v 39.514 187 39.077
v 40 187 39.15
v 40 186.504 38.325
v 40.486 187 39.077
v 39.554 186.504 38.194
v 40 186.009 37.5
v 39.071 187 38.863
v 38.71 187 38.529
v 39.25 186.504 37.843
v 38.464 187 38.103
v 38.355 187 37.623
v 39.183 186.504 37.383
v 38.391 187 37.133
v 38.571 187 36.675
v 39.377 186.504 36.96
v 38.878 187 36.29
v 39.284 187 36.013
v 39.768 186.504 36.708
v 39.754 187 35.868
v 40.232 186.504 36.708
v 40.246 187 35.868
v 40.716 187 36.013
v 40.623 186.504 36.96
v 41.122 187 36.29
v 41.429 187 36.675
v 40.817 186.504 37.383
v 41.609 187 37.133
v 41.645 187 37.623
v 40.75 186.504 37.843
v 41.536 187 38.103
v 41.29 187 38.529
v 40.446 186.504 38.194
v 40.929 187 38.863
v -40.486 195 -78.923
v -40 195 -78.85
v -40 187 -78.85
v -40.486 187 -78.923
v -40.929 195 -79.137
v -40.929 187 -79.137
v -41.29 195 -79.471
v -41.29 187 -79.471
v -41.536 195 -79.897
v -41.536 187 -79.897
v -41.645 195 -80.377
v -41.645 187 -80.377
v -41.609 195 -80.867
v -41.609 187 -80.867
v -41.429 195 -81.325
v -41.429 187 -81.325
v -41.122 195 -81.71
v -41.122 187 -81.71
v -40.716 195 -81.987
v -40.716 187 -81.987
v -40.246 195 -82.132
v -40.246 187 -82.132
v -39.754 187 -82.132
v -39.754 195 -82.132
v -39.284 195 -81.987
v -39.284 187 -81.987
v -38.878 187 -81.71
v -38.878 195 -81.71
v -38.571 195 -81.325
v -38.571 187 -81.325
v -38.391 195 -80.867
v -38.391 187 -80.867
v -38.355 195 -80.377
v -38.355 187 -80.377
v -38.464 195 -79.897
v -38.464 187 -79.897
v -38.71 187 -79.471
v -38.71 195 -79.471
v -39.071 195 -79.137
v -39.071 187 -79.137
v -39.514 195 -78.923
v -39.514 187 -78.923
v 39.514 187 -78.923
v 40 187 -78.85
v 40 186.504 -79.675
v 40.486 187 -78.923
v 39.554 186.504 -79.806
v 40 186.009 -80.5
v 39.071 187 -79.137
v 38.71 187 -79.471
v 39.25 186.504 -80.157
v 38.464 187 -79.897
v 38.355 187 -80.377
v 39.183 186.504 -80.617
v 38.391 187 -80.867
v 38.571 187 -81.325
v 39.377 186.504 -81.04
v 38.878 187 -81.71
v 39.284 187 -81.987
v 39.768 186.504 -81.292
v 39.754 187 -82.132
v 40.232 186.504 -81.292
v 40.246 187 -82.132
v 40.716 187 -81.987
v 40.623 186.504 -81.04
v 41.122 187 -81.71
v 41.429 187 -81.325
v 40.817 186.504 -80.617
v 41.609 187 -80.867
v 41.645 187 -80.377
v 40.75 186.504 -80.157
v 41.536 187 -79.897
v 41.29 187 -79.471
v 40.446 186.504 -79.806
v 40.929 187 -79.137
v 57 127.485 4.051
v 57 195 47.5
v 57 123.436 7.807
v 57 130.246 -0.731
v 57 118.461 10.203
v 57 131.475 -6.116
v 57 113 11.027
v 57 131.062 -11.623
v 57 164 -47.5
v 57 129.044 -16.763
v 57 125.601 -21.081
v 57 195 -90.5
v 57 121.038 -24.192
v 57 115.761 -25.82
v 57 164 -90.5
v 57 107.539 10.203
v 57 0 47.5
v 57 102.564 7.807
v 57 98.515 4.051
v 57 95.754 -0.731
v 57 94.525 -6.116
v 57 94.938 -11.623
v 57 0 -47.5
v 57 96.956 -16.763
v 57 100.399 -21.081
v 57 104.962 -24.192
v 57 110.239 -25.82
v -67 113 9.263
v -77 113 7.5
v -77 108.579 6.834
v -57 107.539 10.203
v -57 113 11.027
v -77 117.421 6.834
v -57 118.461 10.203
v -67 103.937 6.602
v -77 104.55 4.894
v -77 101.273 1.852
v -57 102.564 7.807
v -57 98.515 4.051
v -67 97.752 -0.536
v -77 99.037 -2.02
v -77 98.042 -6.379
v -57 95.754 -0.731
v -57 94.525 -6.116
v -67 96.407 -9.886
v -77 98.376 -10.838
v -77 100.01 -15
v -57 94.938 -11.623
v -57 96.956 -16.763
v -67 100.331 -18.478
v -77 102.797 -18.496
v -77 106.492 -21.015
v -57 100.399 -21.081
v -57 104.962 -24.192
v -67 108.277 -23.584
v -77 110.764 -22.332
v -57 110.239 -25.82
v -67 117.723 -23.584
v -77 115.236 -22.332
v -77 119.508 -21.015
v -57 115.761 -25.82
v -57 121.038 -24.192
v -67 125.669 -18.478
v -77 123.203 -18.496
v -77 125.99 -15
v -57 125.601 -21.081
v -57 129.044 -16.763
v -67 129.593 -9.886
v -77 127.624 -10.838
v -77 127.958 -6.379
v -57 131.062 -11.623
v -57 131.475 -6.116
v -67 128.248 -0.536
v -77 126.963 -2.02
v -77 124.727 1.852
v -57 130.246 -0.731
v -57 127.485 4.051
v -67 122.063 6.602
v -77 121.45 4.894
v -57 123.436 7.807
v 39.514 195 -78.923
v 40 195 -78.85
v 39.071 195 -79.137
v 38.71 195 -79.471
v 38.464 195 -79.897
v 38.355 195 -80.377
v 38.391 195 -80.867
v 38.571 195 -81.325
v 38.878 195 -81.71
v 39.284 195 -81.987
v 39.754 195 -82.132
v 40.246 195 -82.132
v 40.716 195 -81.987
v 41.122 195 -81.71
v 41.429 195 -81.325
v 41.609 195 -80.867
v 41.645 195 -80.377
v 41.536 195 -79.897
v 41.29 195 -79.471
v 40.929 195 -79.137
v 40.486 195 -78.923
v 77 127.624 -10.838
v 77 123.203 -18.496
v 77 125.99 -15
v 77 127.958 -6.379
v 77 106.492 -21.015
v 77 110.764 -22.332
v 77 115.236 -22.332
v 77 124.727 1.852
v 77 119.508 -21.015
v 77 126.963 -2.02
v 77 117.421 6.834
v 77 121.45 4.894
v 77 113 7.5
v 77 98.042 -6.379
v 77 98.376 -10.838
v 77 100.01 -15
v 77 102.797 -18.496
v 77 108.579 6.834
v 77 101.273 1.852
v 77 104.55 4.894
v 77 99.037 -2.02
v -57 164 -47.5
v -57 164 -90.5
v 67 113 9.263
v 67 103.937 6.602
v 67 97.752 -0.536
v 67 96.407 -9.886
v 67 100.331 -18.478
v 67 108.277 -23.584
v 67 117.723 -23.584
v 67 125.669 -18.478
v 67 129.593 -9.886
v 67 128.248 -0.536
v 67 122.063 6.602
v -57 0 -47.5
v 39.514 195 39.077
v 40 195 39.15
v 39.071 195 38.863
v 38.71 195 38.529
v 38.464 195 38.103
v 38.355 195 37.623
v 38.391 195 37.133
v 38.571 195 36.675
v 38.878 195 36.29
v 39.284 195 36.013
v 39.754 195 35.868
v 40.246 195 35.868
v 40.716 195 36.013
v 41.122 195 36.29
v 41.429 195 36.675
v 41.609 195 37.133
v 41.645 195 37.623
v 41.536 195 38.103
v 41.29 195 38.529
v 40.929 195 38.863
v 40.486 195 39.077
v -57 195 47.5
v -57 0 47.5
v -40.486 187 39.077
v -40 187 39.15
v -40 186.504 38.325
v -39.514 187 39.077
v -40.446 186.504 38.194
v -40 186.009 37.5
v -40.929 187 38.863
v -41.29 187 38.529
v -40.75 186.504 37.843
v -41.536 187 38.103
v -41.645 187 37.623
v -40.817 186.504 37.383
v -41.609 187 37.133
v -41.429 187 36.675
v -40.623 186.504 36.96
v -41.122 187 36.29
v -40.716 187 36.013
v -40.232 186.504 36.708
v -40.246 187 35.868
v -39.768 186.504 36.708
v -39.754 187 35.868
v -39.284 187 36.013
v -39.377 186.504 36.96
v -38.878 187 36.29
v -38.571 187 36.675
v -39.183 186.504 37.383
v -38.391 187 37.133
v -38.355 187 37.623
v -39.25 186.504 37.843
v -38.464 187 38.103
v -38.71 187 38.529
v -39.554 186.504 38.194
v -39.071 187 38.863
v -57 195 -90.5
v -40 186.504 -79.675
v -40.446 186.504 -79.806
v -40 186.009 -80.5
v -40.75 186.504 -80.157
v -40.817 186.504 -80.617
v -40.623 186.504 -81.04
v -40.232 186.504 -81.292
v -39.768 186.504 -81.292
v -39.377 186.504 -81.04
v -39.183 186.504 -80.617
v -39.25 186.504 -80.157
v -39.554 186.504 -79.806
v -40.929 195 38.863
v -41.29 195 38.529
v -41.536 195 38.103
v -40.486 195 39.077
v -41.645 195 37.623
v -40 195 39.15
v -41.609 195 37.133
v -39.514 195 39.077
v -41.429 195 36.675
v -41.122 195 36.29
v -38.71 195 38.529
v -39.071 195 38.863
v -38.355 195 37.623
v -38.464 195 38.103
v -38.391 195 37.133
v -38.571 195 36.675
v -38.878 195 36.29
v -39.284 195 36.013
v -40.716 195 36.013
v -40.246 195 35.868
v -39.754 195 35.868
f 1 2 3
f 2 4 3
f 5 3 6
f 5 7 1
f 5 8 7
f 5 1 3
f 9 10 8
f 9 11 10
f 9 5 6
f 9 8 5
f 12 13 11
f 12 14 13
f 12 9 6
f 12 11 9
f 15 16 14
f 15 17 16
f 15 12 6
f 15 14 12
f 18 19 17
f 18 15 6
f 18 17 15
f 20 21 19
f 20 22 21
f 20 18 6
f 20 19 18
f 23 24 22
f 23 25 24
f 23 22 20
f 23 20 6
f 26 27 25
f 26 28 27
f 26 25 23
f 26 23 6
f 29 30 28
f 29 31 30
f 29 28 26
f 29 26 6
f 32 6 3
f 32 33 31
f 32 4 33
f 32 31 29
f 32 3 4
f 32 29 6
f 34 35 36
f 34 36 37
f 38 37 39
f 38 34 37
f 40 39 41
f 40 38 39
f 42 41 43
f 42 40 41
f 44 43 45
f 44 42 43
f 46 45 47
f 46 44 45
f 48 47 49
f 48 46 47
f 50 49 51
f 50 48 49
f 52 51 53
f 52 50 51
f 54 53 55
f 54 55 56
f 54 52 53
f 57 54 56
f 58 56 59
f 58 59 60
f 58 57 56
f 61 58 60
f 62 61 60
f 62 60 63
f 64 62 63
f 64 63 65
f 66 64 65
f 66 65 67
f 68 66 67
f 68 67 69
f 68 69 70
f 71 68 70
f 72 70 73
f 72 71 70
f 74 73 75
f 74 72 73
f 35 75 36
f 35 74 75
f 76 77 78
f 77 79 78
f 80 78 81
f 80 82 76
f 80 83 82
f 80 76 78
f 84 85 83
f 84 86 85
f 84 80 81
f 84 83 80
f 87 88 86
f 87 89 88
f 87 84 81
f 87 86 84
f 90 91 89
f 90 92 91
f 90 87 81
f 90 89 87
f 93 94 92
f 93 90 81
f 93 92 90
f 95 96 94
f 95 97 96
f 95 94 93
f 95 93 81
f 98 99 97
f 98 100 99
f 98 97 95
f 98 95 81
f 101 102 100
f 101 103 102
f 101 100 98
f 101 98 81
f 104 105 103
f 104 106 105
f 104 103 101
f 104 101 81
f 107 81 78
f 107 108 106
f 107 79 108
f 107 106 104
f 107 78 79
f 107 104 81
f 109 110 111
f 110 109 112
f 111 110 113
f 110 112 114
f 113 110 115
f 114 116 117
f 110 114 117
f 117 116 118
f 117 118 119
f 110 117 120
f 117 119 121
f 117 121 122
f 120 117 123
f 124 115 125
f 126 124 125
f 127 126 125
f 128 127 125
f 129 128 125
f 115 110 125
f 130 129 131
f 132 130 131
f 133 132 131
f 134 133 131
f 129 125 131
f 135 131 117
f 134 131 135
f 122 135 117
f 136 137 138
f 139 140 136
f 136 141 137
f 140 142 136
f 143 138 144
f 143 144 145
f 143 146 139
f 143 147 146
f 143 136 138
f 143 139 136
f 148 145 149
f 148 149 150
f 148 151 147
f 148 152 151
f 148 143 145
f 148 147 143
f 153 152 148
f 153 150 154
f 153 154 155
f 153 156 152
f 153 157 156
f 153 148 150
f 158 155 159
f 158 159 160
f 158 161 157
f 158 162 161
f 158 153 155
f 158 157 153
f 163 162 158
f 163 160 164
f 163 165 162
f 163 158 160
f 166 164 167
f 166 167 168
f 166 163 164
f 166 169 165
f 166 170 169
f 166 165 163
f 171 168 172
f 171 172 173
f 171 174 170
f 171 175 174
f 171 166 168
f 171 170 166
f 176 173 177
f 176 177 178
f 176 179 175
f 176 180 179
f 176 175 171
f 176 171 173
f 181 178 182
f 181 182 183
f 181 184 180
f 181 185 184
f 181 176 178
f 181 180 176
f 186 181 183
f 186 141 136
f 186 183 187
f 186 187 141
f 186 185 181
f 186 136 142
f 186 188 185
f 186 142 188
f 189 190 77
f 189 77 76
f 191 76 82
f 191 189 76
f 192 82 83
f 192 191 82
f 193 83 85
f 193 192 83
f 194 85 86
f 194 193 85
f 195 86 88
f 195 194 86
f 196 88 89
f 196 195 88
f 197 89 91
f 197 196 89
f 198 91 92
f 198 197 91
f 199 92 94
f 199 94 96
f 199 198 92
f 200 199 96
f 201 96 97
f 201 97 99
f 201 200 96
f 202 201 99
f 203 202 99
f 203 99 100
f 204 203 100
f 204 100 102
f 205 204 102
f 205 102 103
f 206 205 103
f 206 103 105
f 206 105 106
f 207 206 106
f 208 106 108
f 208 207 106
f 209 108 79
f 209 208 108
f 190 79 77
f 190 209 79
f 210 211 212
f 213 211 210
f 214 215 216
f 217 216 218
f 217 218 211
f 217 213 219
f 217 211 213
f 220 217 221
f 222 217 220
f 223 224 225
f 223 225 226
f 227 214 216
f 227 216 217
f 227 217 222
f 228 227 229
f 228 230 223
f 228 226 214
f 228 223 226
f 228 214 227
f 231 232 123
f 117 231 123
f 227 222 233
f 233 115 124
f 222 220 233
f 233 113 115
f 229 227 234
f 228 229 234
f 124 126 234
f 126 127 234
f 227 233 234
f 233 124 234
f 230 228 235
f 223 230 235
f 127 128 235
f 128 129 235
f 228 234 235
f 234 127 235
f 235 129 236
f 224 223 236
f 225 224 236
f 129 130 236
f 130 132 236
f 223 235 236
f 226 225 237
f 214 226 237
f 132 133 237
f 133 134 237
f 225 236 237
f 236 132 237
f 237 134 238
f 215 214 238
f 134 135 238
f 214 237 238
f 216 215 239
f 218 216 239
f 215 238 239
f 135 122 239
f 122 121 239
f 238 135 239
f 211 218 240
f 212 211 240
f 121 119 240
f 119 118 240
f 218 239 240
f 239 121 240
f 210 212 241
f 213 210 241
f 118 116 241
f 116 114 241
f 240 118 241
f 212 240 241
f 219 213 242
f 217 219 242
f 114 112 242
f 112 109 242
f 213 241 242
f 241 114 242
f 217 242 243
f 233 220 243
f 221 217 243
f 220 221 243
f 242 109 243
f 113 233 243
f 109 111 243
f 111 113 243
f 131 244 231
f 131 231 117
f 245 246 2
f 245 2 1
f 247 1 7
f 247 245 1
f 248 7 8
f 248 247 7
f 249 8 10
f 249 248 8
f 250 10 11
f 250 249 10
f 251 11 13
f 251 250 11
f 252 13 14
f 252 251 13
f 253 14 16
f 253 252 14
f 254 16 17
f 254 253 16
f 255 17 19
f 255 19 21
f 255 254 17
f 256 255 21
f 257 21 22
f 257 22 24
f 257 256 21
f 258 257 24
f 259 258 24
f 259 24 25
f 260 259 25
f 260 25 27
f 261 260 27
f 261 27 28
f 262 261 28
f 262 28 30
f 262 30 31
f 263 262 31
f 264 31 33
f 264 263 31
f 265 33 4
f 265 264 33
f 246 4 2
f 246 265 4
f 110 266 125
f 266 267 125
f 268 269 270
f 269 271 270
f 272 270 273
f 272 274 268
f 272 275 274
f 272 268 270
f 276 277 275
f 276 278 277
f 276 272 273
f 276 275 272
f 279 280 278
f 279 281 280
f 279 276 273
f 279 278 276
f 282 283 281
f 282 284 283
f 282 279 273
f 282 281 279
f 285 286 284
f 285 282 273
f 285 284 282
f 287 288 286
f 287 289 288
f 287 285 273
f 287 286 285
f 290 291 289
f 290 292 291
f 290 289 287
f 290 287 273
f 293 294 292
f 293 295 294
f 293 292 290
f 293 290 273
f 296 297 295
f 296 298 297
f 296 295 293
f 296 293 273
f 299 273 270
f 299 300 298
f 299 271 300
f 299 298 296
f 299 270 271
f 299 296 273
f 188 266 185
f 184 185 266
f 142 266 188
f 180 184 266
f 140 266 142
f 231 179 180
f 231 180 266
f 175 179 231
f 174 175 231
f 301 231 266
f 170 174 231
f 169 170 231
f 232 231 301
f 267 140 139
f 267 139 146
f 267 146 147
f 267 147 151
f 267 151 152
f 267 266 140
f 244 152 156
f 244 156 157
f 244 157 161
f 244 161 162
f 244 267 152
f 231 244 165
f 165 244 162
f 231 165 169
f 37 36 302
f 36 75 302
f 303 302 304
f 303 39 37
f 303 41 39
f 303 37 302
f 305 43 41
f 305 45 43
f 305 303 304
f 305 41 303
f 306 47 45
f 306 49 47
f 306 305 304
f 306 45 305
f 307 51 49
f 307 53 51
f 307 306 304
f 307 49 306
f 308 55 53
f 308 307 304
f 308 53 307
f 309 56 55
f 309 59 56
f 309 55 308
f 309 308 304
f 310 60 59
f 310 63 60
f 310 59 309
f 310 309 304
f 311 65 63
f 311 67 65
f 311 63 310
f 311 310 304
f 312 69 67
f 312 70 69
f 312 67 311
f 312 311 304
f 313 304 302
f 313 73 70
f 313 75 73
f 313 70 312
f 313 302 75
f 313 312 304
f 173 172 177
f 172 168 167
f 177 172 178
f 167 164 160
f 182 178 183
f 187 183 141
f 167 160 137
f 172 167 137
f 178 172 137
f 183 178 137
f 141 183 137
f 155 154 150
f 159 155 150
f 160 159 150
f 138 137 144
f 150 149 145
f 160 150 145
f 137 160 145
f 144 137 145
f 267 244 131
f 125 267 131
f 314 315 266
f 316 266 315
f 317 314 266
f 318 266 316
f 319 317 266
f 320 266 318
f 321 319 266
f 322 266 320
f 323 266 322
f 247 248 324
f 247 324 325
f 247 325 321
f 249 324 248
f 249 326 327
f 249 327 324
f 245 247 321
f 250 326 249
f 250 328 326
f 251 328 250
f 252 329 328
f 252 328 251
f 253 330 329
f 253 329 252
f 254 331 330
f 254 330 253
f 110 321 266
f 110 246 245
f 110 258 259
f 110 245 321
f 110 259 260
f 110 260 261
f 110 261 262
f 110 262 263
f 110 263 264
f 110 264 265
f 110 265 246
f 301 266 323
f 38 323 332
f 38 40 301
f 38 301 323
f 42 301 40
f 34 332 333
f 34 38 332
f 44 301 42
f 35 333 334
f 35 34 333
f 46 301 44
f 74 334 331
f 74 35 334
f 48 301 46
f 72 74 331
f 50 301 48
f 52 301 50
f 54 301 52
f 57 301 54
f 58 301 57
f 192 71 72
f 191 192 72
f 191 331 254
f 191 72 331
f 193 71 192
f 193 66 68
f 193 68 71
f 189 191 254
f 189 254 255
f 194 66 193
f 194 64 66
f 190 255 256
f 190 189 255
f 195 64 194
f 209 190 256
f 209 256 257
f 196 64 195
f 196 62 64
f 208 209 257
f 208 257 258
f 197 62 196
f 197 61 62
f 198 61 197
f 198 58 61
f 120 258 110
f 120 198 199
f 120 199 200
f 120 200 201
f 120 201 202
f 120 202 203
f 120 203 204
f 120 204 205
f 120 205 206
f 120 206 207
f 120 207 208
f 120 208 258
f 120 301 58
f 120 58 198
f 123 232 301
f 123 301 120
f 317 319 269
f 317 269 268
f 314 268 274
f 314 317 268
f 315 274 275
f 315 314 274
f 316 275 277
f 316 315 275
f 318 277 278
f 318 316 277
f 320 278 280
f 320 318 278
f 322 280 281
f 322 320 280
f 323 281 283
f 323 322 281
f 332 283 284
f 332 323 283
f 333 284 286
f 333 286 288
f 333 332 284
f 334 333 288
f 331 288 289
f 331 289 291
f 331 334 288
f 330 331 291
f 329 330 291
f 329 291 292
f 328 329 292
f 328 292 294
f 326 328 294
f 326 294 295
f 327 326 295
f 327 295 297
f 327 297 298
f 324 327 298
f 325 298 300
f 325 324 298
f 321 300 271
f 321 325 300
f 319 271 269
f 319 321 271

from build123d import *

# Parameters (mm, degrees)
SKETCH_1_W                  = 114
SKETCH_1_H                  = 95
EXTRUDE_1_DEPTH             = 164
SKETCH_2_W                  = 114
SKETCH_2_H                  = 138
EXTRUDE_2_DEPTH             = 31
PATTERN_LINEAR_1_COUNT      = 2
PATTERN_LINEAR_1_PITCH      = 118
PATTERN_LINEAR_1_COUNT_DIR2 = 2
PATTERN_LINEAR_1_PITCH_DIR2 = 80
SKETCH_6_R                  = 15
EXTRUDE_3_DEPTH             = 20
DRAFT_1_ANGLE               = 10


with BuildPart() as part:
    # 草图1 → 凸台-拉伸1 (new body)
    with BuildSketch(Plane(origin=(0, 0, 0), x_dir=(1, 0, 0), z_dir=(0, 1, 0))):
        Rectangle(SKETCH_1_W, SKETCH_1_H)
    extrude(amount=EXTRUDE_1_DEPTH)

    # 草图2 → 凸台-拉伸2 (add)
    with BuildSketch(Plane(origin=(0, 164, 0), x_dir=(1, 0, 0), z_dir=(0, 1, 0))):
        with Locations((0, 21.5)):
            Rectangle(SKETCH_2_W, SKETCH_2_H)
    extrude(amount=EXTRUDE_2_DEPTH)

    # 草图5 → M4 螺纹孔1 (revolve, cut)
    with BuildSketch(Plane(origin=(-40, 195, 37.5), x_dir=(0, 0, 1), z_dir=(1, 0, 0))):
        Polygon((0, 0), (0, 8.991420021), (1.65, 8), (1.65, 0), align=None)
    hole_wizard_m4_1 = revolve(axis=Axis((-40, 201.35, 37.5), (0, -1, 0)), mode=Mode.SUBTRACT)

    # 阵列(线性)1: Hole Wizard M4 _1 2 × 2
    with Locations(*[(j * PATTERN_LINEAR_1_PITCH_DIR2, 0, -i * PATTERN_LINEAR_1_PITCH) for i in range(PATTERN_LINEAR_1_COUNT) for j in range(PATTERN_LINEAR_1_COUNT_DIR2) if (i, j) != (0, 0)]):
        add(hole_wizard_m4_1, mode=Mode.SUBTRACT)

    # 草图6 → 凸台-拉伸3 (add)
    with BuildSketch(Plane(origin=(57, 0, 0), x_dir=(0, 0, -1), z_dir=(1, 0, 0))):
        with Locations((7.5, 113)):
            Circle(SKETCH_6_R)
    extrude(amount=EXTRUDE_3_DEPTH)

    # 拔模1
    draft_1_faces = [part.faces().sort_by_distance(p)[0] for p in [
        (67, 113, 7.5),
    ]]
    draft(draft_1_faces, Plane(origin=(77, 113, -7.5), x_dir=(0, 0, 1), z_dir=(1, 0, 0)), DRAFT_1_ANGLE)

    # 镜向1: part across plane


with BuildPart() as part_1:
    add(part.part)
    add(part.part.mirror(Plane(origin=(0, 0, 0), x_dir=(0, 0, 1), z_dir=(1, 0, 0))))


solid = part_1.part
